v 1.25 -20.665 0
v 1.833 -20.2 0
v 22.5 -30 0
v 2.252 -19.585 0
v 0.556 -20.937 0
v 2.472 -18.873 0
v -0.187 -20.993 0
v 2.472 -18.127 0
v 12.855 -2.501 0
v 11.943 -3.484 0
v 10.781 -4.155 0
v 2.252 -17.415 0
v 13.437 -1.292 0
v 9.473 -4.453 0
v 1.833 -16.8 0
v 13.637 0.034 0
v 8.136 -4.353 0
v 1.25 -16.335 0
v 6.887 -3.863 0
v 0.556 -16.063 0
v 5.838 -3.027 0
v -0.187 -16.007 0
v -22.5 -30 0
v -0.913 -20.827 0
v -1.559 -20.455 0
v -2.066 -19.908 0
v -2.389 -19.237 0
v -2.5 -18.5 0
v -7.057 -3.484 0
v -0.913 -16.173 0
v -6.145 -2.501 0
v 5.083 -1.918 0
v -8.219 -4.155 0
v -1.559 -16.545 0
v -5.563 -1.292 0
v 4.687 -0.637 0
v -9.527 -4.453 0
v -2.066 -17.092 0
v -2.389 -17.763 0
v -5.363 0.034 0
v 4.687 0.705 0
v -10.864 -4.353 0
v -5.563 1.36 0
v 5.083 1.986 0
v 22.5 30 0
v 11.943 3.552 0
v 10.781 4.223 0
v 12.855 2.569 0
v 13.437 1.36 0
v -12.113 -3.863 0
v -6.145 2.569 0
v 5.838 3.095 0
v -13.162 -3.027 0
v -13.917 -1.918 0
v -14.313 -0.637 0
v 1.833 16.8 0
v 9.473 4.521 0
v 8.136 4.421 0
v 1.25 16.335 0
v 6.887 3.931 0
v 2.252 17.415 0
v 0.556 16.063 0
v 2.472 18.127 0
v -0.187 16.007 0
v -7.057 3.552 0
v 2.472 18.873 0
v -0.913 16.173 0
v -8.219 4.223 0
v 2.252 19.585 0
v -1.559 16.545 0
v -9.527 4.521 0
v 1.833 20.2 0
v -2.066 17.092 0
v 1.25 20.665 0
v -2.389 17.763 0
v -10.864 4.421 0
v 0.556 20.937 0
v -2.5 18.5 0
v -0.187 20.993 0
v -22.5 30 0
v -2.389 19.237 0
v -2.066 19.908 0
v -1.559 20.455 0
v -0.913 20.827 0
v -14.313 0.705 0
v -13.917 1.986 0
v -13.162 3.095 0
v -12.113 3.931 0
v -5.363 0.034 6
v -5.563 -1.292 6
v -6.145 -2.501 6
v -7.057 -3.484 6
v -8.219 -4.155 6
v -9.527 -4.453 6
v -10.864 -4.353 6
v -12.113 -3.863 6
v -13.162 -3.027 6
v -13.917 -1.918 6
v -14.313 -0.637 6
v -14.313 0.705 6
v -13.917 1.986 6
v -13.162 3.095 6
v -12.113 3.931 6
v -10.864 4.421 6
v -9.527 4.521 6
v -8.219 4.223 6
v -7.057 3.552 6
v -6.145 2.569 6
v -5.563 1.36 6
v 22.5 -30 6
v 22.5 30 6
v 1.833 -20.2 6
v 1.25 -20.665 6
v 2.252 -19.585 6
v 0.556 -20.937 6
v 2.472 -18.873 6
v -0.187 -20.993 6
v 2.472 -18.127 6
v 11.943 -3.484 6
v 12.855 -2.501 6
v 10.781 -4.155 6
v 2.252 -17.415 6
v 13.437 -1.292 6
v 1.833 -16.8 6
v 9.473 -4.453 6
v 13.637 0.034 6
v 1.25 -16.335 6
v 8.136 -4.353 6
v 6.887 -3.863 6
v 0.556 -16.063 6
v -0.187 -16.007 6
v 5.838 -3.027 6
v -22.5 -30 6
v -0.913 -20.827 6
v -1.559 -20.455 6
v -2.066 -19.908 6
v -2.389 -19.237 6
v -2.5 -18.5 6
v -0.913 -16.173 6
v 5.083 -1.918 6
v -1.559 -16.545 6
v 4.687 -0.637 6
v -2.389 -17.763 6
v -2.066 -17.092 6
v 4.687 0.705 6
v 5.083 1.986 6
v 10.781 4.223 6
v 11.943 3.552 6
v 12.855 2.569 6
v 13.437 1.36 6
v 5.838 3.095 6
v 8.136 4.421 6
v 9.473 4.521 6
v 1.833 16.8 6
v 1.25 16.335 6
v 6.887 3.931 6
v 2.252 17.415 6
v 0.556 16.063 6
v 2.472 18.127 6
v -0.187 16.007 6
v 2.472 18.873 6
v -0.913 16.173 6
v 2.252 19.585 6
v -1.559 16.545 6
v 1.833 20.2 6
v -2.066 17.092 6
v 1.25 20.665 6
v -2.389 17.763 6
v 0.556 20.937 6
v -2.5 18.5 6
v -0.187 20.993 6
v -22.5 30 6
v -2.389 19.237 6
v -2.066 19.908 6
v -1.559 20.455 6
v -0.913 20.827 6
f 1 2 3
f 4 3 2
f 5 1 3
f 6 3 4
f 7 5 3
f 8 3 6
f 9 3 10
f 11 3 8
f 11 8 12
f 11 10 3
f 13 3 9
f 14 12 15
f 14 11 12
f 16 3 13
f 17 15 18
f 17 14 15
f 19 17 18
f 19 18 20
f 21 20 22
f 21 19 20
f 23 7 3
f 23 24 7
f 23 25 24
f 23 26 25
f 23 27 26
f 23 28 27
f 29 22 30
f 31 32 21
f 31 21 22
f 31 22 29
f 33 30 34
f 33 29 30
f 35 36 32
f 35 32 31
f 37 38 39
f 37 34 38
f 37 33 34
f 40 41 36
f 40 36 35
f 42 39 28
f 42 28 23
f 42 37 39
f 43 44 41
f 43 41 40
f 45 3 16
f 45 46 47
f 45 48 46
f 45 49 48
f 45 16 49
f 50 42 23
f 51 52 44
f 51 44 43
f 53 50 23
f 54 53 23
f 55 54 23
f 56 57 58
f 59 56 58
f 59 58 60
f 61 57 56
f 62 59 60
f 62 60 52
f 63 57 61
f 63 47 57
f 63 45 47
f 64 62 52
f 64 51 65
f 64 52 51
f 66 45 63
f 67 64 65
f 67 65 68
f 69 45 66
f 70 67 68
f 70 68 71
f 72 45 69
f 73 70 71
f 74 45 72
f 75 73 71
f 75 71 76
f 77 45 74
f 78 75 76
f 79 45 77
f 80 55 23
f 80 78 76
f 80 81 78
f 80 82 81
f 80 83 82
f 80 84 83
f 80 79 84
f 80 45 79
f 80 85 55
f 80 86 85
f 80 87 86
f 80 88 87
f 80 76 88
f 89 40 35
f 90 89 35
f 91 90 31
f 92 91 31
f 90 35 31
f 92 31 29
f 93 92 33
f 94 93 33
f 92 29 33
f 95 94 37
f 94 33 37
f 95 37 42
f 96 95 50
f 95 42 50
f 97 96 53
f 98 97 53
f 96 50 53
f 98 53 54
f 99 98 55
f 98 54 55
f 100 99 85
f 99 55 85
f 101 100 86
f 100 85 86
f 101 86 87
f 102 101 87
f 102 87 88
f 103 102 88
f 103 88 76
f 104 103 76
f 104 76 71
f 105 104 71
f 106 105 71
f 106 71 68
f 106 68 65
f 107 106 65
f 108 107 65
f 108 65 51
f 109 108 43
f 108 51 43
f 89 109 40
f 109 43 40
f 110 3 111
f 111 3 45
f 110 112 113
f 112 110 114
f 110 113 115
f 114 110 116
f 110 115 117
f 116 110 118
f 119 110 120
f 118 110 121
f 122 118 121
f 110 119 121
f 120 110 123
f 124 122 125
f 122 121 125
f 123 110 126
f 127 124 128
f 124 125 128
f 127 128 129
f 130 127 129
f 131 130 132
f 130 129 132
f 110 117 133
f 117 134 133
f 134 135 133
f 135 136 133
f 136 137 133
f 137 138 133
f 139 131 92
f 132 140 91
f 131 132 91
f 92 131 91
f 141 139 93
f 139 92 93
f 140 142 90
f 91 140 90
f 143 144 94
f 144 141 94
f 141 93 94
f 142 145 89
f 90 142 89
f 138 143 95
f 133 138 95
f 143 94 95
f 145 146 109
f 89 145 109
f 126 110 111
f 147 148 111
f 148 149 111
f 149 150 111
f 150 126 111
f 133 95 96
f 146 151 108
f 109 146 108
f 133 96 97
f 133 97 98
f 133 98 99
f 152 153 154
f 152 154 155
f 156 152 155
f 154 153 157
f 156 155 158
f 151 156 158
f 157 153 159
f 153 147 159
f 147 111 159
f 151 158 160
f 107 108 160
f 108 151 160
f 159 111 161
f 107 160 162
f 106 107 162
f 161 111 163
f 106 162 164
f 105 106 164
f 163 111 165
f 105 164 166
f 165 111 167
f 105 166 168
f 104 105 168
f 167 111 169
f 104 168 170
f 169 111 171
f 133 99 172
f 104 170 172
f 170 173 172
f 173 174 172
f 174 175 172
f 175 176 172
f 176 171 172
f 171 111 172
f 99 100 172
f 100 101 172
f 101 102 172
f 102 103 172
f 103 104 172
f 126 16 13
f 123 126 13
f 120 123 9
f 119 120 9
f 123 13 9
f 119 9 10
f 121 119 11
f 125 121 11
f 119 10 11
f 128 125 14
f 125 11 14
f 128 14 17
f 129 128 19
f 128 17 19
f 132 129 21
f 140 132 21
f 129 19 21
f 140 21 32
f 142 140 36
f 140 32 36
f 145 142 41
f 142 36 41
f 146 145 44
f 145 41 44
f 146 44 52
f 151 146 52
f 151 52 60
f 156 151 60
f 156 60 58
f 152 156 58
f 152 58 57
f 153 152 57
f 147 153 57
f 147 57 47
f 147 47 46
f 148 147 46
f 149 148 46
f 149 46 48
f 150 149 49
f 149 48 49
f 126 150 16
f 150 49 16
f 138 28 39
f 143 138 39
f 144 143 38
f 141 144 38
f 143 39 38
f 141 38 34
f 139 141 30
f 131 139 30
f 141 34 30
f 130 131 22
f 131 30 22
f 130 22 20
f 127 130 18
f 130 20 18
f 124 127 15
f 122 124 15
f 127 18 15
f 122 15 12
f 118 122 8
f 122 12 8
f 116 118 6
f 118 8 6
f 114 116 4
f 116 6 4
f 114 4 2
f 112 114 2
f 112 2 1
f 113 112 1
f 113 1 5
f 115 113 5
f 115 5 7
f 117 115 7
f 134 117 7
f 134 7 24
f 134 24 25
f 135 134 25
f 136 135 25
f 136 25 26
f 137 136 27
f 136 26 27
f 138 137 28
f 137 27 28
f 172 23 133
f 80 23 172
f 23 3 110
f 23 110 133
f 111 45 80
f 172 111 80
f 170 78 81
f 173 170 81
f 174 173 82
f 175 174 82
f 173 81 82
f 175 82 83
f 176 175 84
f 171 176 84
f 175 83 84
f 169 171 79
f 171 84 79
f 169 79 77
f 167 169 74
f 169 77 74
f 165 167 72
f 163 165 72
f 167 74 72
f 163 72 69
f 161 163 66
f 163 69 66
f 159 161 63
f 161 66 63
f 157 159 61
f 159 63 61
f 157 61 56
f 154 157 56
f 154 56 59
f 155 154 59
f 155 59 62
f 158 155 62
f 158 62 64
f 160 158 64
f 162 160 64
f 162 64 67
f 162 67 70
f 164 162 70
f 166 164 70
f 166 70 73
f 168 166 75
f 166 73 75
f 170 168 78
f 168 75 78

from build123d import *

# Parameters (mm, degrees)
SKETCH1_W           = 45
SKETCH1_H           = 60
SKETCH1_R           = 4.5
SKETCH1_R_2         = 2.5
BOSS_EXTRUDE1_DEPTH = 6


with BuildPart() as part:
    # Sketch1 → Boss-Extrude1 (new body)
    with BuildSketch(Plane(origin=(0, 0, 0), x_dir=(-1, 0, 0), z_dir=(0, 0, -1))):
        Rectangle(SKETCH1_W, SKETCH1_H)
        with Locations(Location((-9.137137395, 0.033994069, 0), (0, 0, 180))):
            Circle(SKETCH1_R, mode=Mode.SUBTRACT)
        with Locations((0, 18.5)):
            Circle(SKETCH1_R_2, mode=Mode.SUBTRACT)
        with Locations((0, -18.5)):
            Circle(SKETCH1_R_2, mode=Mode.SUBTRACT)
        with Locations(Location((9.862862605, 0.033994069, 0), (0, 0, 180))):
            Circle(SKETCH1_R, mode=Mode.SUBTRACT)
    extrude(amount=-BOSS_EXTRUDE1_DEPTH)


solid = part.part
